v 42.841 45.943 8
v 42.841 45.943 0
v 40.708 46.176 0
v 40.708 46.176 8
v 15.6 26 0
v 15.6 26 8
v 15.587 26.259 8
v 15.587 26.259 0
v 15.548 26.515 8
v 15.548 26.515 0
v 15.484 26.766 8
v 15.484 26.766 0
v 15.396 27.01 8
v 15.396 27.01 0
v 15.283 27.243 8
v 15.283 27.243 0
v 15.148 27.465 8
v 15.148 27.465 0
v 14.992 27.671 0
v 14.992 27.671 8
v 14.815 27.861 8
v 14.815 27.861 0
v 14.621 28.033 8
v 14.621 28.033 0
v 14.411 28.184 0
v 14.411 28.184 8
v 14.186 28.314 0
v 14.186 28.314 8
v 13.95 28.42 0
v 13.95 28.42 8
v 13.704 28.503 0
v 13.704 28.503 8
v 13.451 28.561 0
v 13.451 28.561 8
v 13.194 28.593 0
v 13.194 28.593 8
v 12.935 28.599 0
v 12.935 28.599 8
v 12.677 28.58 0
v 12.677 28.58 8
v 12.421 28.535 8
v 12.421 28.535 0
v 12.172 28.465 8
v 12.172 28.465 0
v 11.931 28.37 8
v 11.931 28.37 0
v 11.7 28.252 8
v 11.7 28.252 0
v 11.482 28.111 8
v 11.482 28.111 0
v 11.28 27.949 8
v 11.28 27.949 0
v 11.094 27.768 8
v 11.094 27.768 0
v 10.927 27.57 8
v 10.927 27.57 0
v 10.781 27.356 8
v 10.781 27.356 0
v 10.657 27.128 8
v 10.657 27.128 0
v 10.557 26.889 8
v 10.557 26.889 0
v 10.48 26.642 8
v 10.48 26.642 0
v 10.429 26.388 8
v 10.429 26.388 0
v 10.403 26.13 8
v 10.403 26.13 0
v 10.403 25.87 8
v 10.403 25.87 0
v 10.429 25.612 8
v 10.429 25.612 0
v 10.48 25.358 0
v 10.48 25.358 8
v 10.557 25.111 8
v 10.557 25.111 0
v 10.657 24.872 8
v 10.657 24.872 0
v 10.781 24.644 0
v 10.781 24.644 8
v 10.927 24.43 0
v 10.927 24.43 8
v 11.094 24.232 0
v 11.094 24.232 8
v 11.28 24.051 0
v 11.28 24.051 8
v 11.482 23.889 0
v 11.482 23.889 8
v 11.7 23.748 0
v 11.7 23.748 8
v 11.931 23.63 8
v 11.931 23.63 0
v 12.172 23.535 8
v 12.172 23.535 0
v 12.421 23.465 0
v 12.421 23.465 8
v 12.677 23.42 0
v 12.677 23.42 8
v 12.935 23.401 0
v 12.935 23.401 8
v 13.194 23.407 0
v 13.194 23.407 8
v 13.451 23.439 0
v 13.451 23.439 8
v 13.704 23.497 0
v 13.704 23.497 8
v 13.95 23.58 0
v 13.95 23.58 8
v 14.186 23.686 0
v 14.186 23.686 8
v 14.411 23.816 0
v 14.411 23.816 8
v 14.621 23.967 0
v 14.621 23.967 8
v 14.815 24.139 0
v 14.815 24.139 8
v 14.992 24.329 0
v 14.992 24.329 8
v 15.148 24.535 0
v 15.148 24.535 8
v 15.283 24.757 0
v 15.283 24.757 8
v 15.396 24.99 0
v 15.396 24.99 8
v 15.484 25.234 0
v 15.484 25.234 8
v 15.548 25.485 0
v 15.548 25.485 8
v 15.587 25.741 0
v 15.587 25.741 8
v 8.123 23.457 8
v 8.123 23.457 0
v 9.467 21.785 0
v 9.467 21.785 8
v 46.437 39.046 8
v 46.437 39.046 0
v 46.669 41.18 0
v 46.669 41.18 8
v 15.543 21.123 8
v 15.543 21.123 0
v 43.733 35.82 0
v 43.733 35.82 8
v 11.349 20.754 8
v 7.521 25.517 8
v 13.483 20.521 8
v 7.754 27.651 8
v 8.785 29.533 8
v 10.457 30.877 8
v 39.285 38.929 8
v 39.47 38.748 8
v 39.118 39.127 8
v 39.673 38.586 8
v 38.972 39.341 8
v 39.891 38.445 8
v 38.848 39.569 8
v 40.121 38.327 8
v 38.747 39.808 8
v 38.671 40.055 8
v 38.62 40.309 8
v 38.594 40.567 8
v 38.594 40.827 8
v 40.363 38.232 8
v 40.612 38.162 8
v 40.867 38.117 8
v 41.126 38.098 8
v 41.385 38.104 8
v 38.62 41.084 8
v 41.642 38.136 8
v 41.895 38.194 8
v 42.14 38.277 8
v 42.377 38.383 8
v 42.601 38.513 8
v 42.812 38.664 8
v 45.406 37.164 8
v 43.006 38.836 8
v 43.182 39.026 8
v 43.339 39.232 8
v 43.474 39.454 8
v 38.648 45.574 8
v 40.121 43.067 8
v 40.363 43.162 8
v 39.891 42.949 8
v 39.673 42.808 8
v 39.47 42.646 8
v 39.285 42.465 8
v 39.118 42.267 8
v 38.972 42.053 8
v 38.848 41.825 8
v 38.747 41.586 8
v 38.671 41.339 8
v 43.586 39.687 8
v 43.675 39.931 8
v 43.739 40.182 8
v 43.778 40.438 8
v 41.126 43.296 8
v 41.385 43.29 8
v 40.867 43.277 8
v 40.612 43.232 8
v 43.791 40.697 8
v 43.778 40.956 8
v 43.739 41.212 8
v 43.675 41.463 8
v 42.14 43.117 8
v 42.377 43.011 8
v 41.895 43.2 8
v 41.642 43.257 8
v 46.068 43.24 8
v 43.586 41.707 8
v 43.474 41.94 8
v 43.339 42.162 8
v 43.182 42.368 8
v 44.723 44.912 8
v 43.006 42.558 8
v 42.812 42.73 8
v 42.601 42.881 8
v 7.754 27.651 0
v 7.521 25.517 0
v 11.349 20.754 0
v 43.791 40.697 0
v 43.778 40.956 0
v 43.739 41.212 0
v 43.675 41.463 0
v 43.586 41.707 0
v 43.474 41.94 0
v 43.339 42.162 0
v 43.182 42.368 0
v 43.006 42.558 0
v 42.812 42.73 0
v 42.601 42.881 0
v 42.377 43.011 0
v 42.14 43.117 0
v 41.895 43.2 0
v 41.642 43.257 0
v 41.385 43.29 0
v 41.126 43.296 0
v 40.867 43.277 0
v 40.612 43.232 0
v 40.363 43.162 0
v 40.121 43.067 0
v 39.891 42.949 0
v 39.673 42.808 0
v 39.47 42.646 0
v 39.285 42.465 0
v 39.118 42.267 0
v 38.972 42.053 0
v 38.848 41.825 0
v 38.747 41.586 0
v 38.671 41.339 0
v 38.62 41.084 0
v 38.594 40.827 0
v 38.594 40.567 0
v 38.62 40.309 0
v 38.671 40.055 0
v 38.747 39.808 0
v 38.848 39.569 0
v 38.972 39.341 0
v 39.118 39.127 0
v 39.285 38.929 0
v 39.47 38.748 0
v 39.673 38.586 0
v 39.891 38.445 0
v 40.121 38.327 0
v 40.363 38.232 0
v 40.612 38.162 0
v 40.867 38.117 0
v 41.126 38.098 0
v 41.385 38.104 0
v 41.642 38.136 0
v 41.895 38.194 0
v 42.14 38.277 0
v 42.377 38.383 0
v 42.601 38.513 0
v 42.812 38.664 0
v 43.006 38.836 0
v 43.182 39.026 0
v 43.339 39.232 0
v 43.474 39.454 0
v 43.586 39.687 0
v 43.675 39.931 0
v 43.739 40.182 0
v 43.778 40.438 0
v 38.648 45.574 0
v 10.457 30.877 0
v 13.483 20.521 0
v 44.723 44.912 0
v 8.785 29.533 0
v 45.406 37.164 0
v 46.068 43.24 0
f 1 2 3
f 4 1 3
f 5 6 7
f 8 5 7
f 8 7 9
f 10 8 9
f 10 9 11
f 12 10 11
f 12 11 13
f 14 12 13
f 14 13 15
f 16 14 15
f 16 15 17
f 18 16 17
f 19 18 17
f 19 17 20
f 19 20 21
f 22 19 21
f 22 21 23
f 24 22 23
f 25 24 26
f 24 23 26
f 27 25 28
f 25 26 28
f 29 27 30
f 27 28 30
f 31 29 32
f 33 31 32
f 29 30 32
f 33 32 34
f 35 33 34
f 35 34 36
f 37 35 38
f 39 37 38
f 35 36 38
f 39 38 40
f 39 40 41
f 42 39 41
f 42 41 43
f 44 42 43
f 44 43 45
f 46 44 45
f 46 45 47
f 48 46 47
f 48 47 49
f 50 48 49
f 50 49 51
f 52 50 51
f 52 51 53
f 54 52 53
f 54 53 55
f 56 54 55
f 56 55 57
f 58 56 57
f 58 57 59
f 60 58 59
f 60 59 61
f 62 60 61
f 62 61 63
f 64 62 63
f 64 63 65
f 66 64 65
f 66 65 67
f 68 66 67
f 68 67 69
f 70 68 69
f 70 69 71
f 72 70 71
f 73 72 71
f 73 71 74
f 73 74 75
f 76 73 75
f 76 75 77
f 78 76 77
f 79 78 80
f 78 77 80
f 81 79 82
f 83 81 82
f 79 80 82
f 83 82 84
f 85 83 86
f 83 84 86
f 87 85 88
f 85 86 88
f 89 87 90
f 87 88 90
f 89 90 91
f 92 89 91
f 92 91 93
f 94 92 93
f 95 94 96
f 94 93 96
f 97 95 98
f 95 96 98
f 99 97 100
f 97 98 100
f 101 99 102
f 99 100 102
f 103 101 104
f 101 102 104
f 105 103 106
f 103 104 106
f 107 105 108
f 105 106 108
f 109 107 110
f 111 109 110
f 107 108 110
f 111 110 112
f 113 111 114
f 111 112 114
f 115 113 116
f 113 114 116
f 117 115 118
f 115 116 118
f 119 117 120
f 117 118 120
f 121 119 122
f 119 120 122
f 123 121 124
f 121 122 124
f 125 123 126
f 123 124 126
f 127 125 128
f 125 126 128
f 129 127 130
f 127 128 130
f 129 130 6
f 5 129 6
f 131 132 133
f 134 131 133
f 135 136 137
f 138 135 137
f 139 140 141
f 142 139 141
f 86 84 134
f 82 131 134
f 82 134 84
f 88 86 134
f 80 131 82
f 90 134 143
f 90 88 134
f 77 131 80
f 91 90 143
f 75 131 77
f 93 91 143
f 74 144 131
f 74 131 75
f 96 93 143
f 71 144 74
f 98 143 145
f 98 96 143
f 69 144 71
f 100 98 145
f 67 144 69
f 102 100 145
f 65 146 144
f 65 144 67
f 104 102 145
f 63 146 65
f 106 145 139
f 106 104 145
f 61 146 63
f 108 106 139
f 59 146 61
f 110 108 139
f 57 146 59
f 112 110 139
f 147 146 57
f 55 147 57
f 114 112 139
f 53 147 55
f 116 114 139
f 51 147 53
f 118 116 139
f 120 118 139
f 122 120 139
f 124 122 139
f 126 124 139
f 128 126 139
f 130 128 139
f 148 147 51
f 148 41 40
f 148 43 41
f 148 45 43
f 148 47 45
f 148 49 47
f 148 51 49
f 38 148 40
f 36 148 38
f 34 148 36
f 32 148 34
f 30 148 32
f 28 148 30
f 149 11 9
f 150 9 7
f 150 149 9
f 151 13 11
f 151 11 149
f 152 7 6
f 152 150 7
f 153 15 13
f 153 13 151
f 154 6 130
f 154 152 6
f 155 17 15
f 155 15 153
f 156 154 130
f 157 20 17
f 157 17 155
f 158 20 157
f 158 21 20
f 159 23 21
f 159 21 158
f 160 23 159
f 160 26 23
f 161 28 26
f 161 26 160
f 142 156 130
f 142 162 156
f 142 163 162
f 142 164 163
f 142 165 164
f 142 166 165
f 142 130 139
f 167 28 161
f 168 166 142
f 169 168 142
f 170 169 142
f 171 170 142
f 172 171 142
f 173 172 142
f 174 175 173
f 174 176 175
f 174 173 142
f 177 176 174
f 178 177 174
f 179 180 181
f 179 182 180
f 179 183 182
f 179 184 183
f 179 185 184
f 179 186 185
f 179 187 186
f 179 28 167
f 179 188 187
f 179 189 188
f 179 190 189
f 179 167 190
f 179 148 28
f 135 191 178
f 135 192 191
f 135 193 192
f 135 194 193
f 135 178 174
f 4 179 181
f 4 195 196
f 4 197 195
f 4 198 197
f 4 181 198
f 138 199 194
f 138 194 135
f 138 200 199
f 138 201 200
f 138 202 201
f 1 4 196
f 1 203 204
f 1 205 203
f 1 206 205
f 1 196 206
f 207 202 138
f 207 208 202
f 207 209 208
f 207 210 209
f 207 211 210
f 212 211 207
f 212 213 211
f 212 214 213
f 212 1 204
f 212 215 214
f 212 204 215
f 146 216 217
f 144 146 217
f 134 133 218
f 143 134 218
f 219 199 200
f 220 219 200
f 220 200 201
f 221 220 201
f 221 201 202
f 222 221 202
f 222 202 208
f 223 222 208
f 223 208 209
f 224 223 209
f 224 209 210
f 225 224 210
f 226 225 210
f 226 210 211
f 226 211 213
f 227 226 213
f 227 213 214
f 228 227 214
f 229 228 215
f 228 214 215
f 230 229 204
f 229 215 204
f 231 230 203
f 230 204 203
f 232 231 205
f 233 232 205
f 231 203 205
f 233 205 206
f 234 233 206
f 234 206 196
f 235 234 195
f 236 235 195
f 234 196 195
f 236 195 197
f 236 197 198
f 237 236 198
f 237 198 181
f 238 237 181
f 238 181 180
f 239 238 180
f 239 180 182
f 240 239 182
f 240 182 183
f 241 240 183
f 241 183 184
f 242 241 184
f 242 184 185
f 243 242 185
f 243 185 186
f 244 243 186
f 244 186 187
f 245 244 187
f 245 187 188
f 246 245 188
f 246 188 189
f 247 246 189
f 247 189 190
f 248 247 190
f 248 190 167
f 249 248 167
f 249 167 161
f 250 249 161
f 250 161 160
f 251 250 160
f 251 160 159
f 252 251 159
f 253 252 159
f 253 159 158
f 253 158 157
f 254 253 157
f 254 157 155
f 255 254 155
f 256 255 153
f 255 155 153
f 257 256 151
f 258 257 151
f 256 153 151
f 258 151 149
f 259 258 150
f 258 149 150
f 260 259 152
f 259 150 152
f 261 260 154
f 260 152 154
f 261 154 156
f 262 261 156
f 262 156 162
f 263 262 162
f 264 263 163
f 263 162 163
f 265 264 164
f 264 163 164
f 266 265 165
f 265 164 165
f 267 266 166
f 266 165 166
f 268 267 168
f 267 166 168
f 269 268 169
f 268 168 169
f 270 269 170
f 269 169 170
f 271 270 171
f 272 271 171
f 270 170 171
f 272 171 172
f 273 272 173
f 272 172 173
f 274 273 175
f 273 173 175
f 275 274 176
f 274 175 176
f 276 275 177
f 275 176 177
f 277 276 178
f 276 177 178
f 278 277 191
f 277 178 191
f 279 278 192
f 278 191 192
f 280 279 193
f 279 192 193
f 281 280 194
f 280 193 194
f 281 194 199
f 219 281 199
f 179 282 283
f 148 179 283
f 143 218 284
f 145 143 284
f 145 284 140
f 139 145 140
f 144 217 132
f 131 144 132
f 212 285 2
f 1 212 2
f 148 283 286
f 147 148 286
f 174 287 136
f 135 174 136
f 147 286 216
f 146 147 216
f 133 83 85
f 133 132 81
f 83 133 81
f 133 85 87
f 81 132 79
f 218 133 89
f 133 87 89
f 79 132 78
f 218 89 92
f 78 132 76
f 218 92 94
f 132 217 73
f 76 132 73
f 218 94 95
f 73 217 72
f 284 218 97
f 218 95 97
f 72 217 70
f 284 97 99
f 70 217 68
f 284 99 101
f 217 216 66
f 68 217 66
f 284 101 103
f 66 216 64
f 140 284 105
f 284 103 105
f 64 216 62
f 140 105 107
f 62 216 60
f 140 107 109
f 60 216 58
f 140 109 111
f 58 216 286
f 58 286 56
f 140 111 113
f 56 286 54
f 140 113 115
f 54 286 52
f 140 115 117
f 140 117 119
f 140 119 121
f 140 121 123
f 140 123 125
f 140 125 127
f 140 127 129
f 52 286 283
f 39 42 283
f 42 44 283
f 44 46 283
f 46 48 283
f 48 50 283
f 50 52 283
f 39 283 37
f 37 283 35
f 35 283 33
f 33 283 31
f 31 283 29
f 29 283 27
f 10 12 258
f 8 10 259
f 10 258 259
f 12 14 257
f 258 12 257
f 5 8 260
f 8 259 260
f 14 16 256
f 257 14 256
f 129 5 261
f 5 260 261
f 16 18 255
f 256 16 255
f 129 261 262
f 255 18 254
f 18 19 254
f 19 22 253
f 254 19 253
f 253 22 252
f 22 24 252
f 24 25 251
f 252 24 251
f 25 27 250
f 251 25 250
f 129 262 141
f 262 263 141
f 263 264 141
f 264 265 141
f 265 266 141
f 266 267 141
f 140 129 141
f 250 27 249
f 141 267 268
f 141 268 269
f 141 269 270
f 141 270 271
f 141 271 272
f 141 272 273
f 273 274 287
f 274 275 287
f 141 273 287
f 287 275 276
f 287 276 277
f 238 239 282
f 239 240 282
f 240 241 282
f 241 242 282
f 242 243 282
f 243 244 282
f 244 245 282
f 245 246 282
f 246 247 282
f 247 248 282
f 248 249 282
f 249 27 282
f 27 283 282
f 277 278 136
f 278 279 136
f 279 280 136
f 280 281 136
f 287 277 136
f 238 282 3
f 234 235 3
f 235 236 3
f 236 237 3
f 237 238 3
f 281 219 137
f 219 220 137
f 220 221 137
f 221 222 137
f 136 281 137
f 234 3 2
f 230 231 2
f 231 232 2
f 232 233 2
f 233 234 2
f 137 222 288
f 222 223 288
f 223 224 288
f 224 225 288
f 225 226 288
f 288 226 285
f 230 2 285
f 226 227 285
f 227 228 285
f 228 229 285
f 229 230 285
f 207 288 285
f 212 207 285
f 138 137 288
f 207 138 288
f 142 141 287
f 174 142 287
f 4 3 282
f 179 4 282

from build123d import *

# Parameters (mm, degrees)
HIGH_SLIDER_LINK_DEPTH = 8
SKETCH_2_R             = 2.6
PIN_BORE_DEPTH         = 67.137967524
SKETCH_3_R             = 2.6
CUT_EXTRUDE_2_DEPTH    = 67.137967524


with BuildPart() as part:
    # 草图1 → High_slider_link (new body)
    with BuildSketch(Plane.XY):
        Polygon((43.733202086, 35.819954019), (45.406009546, 37.164202316), (46.437060568, 39.046281505), (46.66938698, 41.17966209), (46.067619192, 43.239556216), (44.723370895, 44.912363676), (42.841291706, 45.943414698), (40.707911121, 46.17574111), (38.648016994, 45.573973323), (10.457407454, 30.877009652), (8.784599994, 29.532761355), (7.753548972, 27.650682166), (7.52122256, 25.517301581), (8.122990348, 23.457407454), (9.467238645, 21.784599994), (11.349317834, 20.753548972), (13.482698419, 20.52122256), (15.542592546, 21.122990348), align=None)
    extrude(amount=HIGH_SLIDER_LINK_DEPTH)

    # 草图2 → Pin_bore (cut, through all)
    with BuildSketch(Plane.XY.offset(8)):
        with Locations((41.19060954, 40.696963671)):
            Circle(SKETCH_2_R)
    extrude(amount=-PIN_BORE_DEPTH, mode=Mode.SUBTRACT)

    # 草图3 → 切除-拉伸2 (cut, through all)
    with BuildSketch(Plane.XY.offset(8)):
        with Locations((13, 26)):
            Circle(SKETCH_3_R)
    extrude(amount=-CUT_EXTRUDE_2_DEPTH, mode=Mode.SUBTRACT)


solid = part.part
